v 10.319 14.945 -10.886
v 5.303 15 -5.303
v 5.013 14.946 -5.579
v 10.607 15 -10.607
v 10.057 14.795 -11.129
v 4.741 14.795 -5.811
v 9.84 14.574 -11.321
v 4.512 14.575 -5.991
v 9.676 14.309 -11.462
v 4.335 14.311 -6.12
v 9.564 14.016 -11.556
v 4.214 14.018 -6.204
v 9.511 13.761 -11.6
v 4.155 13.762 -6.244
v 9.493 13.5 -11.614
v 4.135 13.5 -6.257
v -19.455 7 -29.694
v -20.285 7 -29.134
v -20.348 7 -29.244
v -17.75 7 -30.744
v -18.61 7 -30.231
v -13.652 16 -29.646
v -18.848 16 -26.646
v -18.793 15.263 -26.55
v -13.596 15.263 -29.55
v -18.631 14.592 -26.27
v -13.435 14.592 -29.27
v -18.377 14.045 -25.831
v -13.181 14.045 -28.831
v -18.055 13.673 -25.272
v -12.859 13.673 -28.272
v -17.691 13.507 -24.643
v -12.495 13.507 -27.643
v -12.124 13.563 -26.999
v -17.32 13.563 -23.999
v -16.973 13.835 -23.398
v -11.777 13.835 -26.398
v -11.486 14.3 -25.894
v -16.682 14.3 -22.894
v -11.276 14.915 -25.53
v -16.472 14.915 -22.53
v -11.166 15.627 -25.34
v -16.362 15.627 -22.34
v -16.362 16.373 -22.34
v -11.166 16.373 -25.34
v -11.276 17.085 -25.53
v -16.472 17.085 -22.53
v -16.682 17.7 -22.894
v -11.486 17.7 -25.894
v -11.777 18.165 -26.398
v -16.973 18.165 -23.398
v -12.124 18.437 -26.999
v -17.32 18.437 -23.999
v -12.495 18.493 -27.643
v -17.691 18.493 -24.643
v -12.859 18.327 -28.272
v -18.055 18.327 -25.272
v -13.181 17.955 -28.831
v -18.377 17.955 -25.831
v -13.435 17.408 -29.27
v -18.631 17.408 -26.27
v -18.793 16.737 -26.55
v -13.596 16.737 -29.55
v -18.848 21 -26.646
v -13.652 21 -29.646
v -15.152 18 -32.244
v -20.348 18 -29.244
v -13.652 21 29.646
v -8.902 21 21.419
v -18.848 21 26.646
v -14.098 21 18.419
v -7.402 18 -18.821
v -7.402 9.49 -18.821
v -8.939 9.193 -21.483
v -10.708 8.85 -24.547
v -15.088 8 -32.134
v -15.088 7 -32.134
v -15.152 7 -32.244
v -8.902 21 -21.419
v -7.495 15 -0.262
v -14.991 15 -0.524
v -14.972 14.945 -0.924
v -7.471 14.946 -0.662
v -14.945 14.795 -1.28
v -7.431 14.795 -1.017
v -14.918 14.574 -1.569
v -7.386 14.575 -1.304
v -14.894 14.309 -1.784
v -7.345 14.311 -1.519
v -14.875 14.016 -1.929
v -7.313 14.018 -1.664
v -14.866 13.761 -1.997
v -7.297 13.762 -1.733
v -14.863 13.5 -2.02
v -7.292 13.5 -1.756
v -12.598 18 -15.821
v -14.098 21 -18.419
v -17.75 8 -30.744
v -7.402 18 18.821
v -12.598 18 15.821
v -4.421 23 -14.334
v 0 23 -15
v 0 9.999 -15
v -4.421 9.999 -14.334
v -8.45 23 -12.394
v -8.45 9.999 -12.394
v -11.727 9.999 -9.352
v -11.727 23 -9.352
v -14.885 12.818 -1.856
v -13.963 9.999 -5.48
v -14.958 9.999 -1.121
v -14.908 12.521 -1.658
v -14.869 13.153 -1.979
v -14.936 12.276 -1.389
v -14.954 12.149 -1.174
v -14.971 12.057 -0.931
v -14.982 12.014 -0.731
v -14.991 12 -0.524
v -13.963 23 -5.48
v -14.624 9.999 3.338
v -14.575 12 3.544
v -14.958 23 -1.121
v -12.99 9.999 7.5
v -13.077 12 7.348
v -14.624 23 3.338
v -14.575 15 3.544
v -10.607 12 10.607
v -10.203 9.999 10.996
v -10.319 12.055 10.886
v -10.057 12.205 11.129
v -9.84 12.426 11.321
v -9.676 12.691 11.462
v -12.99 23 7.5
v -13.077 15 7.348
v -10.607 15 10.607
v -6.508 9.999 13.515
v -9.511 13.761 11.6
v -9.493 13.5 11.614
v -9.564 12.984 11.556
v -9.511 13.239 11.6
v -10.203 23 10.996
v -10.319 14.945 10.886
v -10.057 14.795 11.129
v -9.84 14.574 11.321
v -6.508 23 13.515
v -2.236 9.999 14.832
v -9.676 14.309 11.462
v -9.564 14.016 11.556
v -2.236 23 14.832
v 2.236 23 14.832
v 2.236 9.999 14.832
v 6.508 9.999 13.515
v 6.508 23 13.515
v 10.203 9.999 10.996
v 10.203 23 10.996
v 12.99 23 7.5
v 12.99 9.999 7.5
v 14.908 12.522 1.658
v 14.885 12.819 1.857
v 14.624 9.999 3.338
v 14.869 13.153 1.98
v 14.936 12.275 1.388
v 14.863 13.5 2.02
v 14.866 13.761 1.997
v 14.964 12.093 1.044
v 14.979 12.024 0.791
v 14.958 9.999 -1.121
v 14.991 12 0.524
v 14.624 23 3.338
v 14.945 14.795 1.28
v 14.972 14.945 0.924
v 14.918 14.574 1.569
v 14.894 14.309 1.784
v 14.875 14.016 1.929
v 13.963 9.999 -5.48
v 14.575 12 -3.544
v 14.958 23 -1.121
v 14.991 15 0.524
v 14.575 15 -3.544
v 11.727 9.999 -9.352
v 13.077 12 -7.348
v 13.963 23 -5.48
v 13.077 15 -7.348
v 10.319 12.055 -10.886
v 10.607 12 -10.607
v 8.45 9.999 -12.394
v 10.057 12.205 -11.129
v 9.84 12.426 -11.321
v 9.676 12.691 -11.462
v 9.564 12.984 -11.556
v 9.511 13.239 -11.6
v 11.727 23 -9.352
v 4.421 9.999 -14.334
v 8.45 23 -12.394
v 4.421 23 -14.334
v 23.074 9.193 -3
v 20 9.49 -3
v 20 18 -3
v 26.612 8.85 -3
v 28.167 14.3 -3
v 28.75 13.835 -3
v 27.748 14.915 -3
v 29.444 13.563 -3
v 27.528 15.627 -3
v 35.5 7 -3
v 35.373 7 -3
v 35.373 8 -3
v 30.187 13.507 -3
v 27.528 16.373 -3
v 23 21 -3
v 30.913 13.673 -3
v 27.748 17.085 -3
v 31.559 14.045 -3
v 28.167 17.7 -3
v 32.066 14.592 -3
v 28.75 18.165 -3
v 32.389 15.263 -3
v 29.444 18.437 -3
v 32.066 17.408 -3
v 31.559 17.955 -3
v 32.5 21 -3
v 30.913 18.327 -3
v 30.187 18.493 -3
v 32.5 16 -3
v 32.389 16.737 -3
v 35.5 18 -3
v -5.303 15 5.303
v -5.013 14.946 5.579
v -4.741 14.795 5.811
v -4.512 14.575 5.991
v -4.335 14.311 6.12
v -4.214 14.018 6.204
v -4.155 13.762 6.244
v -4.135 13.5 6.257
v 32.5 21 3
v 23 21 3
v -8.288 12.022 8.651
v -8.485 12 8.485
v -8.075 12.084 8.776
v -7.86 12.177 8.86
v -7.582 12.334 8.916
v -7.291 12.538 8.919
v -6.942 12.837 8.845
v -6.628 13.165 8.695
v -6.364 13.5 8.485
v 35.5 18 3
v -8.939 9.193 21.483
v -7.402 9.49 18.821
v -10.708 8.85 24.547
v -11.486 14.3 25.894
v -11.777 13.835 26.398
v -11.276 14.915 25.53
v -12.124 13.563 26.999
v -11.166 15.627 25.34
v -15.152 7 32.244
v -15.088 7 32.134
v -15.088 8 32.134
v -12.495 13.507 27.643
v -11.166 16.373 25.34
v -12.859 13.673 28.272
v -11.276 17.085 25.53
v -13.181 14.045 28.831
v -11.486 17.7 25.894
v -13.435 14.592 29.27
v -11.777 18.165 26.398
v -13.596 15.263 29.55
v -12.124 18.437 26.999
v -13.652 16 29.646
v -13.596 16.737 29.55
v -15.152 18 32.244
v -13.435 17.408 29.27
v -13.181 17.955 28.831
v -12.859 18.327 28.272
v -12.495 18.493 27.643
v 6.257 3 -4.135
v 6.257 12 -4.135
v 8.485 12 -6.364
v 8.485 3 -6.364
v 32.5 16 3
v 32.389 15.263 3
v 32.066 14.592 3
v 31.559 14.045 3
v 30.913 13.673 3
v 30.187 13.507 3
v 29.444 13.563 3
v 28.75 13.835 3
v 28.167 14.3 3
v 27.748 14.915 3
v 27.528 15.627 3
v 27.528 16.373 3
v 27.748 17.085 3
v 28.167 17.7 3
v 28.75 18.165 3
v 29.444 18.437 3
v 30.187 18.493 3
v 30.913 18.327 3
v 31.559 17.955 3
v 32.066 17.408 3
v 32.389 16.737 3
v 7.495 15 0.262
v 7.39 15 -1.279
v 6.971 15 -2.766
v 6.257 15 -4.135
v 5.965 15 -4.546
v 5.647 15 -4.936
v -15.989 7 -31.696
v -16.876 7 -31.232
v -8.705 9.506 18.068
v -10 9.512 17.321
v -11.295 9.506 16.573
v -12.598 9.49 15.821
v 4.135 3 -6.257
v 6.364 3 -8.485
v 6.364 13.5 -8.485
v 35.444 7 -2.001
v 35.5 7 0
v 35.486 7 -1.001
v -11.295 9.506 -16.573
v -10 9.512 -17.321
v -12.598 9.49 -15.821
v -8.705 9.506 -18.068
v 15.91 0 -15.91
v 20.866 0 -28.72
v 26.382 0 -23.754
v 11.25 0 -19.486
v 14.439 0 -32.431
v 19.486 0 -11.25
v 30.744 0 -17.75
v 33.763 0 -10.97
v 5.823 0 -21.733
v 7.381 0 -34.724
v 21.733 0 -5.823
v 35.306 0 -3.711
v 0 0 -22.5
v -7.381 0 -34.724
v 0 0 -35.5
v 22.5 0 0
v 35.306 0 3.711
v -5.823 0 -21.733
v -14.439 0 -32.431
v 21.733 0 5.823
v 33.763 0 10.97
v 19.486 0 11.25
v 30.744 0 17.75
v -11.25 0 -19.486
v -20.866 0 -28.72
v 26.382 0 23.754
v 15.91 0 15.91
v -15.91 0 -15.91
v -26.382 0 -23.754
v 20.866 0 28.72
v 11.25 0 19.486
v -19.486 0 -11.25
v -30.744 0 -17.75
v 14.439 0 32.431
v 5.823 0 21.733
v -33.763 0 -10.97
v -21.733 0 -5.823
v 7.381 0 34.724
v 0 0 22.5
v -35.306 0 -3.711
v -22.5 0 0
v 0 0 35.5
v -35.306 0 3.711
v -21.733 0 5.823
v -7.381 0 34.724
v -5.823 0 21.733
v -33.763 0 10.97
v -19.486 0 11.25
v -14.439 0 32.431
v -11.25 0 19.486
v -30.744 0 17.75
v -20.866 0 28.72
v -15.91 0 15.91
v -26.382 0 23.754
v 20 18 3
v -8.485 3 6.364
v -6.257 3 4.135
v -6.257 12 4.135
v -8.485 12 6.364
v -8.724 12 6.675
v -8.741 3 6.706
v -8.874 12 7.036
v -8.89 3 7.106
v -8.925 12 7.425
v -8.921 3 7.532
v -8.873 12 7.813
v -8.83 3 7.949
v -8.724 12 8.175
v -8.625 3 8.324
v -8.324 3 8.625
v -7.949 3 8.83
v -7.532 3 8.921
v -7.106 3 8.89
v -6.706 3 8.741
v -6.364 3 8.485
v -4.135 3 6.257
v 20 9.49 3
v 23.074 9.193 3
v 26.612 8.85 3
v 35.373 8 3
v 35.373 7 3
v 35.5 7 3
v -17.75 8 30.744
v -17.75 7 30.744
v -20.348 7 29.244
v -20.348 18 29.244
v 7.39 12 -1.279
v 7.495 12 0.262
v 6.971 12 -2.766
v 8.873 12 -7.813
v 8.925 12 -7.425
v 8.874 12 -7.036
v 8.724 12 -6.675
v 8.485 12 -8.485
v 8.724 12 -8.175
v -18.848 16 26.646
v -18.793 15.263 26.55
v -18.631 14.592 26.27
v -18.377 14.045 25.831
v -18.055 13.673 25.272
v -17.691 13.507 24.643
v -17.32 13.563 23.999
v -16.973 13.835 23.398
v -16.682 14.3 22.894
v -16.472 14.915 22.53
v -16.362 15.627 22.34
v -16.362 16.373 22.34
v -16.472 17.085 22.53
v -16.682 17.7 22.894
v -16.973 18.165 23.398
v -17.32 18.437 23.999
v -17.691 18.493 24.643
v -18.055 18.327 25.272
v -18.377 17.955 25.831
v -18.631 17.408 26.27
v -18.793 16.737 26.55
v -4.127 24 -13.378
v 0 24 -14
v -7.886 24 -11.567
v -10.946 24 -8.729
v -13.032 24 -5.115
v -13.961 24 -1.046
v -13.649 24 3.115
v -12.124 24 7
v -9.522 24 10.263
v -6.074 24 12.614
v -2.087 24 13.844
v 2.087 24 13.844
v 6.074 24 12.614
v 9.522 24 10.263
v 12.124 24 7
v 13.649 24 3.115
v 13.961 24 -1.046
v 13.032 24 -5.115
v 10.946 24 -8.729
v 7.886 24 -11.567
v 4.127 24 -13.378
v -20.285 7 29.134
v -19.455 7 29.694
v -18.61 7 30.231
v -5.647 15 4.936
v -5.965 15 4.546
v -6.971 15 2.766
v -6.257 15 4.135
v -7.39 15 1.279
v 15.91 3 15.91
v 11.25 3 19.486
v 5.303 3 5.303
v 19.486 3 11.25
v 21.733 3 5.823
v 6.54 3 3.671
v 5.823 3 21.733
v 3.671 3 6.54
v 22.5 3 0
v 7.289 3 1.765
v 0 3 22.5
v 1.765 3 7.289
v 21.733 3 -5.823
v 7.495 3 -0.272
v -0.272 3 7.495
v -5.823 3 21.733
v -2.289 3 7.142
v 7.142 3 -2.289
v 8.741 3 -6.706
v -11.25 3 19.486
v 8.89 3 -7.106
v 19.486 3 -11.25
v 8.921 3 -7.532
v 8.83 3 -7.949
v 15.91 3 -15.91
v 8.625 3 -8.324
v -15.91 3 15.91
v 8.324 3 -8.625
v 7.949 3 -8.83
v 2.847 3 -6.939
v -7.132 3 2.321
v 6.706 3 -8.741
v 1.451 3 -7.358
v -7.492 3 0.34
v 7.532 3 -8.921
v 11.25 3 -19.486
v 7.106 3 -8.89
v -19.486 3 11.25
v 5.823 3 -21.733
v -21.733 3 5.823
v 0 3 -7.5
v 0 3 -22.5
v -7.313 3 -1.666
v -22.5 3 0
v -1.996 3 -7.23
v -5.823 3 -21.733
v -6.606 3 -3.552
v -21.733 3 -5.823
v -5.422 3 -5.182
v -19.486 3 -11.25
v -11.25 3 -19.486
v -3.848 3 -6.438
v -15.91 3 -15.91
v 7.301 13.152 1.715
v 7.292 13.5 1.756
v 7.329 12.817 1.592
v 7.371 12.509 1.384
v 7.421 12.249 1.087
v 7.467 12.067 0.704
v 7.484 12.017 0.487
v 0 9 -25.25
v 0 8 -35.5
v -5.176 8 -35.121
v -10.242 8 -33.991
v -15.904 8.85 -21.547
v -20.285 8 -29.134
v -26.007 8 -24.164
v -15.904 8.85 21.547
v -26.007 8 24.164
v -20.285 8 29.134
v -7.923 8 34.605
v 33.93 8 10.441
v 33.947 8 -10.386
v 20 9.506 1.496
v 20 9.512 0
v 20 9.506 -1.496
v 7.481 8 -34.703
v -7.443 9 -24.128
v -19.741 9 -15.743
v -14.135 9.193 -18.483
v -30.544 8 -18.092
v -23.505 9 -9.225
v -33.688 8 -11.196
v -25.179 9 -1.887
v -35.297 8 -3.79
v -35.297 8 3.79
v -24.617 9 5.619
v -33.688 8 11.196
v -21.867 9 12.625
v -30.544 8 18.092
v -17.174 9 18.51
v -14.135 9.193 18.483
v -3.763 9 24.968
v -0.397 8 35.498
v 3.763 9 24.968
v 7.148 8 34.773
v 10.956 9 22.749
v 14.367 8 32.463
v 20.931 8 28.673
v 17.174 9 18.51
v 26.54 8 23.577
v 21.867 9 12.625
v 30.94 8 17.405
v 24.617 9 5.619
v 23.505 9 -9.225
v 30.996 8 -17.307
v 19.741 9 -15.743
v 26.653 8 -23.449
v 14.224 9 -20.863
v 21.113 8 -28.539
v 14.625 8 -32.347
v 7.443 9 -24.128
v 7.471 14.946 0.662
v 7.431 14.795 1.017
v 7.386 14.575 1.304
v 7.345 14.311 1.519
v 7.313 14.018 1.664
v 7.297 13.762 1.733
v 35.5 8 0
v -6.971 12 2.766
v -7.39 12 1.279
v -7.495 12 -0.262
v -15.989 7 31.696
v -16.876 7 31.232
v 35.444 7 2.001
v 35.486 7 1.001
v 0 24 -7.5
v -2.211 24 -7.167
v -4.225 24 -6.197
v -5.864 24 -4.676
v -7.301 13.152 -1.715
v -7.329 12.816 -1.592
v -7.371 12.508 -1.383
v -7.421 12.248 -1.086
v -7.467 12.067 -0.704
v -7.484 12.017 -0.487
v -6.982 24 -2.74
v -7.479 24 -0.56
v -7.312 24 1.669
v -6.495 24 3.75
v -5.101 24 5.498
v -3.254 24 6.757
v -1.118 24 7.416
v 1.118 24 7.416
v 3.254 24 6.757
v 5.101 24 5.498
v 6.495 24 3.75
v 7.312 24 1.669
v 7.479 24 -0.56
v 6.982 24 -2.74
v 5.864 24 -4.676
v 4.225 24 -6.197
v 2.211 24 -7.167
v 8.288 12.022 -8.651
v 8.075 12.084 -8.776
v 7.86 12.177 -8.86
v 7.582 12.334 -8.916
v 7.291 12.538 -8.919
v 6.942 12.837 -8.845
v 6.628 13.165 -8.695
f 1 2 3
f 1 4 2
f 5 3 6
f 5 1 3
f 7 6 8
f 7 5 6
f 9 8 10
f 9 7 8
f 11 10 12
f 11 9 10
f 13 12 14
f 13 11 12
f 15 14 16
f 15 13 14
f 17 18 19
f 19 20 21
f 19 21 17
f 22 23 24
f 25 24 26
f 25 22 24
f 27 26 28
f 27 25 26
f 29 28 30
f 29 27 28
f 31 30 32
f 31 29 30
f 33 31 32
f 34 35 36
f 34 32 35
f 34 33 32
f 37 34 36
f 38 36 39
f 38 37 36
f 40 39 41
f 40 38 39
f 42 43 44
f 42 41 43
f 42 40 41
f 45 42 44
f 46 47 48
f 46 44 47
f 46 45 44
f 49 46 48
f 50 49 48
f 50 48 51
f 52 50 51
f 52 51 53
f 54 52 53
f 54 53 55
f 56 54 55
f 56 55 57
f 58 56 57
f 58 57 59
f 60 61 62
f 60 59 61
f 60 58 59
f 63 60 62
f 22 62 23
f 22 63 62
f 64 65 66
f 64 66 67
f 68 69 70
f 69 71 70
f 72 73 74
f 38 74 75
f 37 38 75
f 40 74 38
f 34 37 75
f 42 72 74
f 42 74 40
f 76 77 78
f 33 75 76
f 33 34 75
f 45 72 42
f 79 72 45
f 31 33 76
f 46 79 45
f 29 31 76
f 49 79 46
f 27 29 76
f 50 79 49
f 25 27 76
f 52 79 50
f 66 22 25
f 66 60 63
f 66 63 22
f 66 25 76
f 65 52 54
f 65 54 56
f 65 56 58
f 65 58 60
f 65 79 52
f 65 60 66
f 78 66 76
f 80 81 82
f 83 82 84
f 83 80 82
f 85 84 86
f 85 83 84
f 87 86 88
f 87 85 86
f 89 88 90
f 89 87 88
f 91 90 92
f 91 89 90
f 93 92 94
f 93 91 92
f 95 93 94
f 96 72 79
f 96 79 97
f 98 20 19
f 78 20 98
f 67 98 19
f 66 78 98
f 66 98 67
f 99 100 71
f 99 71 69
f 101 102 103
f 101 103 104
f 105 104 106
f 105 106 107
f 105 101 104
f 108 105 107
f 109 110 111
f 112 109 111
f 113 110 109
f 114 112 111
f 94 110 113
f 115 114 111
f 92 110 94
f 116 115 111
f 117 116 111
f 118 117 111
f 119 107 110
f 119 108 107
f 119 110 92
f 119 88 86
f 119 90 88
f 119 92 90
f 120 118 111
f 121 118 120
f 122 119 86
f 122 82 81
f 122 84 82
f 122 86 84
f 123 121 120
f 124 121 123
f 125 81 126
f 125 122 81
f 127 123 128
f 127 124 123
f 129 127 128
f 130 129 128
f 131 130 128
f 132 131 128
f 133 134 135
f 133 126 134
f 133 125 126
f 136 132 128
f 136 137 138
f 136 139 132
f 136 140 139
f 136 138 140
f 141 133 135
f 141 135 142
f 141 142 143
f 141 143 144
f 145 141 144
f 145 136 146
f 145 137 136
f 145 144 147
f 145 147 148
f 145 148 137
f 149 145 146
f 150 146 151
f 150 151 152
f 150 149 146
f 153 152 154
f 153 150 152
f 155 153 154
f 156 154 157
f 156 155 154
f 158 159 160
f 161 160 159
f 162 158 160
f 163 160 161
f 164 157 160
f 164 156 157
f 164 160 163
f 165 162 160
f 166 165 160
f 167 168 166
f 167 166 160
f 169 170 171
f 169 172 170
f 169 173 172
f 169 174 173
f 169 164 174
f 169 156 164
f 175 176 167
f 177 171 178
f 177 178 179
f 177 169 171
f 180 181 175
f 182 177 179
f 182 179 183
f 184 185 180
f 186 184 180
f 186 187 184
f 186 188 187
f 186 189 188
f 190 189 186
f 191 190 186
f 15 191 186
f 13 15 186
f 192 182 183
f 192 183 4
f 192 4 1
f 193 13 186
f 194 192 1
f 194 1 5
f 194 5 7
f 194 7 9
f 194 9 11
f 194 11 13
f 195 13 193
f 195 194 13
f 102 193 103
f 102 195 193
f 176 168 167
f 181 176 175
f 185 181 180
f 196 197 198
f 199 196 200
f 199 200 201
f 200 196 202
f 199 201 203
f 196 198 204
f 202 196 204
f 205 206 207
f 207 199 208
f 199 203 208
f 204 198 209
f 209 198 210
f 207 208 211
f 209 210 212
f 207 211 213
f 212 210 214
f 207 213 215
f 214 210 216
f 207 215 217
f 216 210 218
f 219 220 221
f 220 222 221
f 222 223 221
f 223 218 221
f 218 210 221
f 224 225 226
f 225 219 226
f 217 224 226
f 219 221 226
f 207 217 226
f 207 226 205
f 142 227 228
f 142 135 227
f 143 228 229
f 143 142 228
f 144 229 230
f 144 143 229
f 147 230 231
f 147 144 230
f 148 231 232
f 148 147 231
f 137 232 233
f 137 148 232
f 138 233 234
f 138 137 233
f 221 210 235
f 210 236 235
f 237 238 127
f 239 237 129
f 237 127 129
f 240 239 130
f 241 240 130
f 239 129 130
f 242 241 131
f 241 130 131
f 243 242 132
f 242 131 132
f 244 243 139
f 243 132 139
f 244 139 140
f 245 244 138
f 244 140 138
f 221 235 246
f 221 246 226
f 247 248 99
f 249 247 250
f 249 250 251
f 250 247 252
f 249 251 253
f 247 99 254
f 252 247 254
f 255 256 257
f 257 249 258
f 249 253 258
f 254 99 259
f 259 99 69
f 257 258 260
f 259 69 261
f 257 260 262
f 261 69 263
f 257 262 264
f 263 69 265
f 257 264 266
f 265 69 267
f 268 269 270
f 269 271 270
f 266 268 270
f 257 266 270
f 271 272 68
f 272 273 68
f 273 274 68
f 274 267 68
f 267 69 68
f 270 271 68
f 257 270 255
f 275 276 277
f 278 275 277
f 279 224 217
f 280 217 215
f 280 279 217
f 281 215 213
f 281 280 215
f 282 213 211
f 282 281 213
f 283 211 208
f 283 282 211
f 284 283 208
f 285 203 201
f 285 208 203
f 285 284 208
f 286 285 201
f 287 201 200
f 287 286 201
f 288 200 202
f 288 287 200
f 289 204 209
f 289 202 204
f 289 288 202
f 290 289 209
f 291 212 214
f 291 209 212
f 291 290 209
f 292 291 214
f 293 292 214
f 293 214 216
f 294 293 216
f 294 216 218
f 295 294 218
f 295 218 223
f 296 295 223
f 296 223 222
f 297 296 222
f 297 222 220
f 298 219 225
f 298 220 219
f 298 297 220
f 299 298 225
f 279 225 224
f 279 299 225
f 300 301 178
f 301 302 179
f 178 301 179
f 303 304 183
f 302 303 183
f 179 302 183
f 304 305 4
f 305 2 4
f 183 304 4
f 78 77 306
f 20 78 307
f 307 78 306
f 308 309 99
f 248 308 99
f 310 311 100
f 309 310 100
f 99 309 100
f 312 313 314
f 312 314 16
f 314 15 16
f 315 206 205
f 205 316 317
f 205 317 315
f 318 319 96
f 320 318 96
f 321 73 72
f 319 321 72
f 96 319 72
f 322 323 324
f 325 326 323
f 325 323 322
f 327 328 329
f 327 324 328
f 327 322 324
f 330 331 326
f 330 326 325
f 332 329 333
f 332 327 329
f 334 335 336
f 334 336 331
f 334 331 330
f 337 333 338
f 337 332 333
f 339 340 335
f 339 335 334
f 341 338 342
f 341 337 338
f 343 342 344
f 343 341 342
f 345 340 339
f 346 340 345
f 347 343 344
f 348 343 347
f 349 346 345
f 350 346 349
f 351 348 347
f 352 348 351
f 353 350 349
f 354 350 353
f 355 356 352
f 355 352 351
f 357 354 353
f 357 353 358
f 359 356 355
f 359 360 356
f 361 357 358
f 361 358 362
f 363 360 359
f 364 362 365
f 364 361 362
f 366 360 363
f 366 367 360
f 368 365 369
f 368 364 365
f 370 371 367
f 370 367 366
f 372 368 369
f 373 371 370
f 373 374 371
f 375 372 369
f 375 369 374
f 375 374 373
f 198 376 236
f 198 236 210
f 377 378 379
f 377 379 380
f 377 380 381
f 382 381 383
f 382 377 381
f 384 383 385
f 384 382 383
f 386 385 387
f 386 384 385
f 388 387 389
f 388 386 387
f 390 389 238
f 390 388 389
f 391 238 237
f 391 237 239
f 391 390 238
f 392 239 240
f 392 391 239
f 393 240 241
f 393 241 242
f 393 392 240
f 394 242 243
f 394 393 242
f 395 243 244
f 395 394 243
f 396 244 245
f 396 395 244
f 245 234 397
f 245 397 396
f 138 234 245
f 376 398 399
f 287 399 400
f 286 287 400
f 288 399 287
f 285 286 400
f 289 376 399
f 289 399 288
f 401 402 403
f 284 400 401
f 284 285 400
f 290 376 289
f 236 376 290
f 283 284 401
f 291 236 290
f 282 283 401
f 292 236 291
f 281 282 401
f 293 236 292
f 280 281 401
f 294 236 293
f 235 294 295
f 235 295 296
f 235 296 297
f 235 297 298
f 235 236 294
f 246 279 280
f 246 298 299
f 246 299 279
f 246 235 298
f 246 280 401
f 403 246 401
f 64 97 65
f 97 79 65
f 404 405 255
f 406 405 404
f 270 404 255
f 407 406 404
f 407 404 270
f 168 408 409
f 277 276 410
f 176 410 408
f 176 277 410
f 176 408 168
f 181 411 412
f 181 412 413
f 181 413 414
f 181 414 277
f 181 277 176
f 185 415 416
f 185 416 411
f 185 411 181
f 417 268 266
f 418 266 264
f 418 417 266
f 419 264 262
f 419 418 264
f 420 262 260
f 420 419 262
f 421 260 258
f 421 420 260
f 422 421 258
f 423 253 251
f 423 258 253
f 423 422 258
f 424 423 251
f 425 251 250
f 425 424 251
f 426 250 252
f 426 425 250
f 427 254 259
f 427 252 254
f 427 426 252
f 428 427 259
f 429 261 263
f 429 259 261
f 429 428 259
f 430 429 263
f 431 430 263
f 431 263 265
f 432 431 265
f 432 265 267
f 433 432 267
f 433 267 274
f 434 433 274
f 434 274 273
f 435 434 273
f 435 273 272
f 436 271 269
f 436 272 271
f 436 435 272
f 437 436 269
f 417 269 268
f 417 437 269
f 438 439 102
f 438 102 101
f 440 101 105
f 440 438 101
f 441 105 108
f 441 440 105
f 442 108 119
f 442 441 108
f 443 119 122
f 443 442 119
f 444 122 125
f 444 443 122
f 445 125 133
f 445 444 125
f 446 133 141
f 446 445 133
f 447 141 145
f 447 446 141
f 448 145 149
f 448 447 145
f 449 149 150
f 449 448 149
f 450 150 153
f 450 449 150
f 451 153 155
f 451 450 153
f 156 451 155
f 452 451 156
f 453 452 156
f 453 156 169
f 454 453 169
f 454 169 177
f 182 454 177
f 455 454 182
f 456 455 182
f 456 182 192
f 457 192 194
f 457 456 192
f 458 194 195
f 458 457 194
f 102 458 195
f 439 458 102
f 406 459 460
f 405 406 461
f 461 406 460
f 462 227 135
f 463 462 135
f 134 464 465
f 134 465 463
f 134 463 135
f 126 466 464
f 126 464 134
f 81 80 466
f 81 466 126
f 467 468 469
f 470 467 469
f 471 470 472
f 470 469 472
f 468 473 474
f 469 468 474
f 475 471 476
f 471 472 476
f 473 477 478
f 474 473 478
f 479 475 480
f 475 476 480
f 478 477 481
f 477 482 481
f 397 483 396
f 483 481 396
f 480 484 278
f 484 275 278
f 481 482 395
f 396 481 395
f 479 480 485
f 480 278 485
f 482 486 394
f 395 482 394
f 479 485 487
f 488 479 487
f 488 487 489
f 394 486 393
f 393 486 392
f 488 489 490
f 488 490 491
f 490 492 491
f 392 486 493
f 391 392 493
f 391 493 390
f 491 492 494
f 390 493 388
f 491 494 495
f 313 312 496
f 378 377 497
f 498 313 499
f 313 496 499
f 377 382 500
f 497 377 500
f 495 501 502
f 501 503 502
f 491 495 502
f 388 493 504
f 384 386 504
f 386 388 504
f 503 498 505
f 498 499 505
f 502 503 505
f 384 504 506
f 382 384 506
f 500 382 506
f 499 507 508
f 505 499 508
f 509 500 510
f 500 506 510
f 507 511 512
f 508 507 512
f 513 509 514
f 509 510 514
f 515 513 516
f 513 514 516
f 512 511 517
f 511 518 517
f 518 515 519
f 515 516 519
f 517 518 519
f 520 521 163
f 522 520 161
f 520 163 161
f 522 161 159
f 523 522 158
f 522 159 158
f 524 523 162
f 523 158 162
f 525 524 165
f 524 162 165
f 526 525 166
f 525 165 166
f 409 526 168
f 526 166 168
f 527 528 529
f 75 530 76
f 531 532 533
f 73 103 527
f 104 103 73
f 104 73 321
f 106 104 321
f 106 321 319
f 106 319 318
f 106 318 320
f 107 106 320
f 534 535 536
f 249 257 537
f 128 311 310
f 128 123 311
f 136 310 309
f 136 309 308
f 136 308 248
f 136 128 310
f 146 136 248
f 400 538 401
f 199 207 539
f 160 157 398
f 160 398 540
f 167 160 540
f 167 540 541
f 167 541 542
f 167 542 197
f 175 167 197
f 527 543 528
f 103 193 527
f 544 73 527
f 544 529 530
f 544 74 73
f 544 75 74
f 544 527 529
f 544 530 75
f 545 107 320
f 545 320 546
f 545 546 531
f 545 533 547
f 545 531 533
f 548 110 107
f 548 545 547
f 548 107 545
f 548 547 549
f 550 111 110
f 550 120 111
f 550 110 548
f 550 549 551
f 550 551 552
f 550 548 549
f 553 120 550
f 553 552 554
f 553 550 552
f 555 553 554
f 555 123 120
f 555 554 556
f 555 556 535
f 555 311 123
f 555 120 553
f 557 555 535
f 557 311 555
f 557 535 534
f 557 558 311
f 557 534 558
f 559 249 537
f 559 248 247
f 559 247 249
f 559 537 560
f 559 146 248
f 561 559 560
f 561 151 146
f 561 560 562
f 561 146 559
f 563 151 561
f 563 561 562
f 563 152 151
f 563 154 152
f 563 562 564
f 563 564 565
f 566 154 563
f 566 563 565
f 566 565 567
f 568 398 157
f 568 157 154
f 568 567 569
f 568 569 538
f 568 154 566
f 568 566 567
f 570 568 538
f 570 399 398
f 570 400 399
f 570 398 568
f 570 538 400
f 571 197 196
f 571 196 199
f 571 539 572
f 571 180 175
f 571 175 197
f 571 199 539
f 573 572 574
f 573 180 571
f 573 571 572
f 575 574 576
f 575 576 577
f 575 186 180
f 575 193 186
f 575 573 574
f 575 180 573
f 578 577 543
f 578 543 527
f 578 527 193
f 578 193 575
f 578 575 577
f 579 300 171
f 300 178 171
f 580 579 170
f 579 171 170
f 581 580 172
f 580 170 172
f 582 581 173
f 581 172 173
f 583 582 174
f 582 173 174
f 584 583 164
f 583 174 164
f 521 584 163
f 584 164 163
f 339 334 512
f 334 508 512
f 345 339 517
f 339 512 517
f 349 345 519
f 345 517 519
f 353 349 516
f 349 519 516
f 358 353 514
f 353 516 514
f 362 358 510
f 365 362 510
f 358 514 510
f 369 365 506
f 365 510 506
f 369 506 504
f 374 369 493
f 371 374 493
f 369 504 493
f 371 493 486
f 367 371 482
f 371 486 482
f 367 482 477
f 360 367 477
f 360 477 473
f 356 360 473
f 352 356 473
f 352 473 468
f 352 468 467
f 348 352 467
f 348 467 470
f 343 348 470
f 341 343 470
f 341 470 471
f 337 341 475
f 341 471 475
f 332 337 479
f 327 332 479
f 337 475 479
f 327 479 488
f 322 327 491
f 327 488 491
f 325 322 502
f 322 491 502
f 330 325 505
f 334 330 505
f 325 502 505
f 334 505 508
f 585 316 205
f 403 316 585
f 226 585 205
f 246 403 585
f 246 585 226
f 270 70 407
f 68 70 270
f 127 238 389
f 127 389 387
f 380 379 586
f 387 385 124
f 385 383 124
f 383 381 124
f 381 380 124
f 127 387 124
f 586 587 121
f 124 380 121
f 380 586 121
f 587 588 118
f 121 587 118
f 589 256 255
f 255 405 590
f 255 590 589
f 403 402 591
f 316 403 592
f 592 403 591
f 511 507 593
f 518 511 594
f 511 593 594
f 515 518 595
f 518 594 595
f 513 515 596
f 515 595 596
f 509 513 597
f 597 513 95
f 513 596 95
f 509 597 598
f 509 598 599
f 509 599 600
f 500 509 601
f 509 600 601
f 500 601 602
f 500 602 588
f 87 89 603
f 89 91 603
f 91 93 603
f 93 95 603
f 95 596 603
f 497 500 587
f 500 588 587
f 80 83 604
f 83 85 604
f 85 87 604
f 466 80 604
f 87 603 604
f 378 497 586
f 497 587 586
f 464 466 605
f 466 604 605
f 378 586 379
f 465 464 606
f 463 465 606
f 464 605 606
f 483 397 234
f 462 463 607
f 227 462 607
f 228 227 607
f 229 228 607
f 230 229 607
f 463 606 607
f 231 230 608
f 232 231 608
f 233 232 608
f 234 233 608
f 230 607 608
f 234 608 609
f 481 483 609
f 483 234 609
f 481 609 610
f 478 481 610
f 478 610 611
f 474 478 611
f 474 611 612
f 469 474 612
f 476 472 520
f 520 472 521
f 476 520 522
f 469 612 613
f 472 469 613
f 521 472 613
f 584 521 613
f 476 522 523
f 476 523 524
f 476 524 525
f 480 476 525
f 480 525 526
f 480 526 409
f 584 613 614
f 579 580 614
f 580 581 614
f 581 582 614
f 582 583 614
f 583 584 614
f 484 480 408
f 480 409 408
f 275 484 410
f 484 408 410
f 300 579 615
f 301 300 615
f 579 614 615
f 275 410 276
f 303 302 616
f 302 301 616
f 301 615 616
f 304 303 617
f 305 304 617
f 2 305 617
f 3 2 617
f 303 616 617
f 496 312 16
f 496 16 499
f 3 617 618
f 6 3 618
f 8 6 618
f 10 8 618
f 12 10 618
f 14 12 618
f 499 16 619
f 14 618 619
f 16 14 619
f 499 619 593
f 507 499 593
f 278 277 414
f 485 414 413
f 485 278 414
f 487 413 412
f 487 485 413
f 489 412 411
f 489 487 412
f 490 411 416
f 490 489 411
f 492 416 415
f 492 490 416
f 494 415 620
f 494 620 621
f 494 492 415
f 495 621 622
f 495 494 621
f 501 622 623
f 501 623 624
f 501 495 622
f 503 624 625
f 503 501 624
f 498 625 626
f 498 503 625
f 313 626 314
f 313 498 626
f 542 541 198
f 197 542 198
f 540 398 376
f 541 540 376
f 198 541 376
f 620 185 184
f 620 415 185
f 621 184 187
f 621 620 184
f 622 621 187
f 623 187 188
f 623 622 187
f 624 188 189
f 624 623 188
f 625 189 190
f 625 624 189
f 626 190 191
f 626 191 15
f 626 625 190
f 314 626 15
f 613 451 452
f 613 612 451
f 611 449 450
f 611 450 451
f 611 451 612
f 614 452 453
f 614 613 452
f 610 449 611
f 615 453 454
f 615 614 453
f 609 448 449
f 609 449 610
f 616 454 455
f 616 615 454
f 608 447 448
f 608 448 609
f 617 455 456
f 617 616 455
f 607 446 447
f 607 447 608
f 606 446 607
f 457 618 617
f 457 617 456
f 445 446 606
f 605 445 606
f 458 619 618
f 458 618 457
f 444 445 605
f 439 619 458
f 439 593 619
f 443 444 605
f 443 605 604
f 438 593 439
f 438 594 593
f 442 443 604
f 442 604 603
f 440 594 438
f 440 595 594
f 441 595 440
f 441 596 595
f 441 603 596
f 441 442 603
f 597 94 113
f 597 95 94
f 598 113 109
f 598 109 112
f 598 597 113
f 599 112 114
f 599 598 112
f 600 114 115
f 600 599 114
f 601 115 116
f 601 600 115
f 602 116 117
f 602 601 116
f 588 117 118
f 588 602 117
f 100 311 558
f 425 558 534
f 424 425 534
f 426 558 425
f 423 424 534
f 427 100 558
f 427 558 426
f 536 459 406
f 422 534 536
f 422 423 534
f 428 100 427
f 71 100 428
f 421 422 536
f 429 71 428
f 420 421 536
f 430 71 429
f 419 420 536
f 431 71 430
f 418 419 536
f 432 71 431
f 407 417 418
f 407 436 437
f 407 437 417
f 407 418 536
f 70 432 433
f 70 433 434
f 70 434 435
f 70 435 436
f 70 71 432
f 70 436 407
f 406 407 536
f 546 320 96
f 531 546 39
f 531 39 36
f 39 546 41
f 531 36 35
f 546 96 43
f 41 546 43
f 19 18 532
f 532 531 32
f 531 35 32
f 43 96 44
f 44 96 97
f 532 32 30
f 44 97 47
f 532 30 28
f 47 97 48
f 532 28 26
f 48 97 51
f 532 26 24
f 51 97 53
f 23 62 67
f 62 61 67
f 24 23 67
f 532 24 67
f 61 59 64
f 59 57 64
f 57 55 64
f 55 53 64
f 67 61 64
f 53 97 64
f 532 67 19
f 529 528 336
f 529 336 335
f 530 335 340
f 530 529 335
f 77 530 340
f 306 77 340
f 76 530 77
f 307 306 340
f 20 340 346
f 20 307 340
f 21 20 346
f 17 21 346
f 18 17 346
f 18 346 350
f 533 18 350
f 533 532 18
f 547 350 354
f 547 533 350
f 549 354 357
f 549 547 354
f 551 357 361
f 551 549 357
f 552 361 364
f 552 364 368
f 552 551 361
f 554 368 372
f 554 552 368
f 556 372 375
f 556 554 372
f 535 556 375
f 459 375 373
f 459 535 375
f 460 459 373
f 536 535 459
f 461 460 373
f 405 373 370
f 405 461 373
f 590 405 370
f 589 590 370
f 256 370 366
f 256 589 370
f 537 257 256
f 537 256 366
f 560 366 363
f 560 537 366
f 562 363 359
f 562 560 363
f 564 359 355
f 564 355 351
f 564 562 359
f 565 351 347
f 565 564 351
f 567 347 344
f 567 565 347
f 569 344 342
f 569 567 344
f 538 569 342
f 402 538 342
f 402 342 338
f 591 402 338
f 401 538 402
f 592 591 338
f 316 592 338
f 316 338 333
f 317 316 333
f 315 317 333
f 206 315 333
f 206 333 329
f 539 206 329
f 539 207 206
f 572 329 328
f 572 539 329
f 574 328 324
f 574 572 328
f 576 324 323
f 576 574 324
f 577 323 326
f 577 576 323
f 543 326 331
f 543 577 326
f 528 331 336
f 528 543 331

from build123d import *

# Parameters (mm, degrees)
SKETCH2_W           = 15.5
SKETCH2_H           = 14
BOSS_EXTRUDE1_DEPTH = 3
CIRPATTERN1_COUNT   = 3
CUT_EXTRUDE1_DEPTH  = 12
CUT_EXTRUDE2_START  = -9
CUT_EXTRUDE2_DEPTH  = 3
CUT_EXTRUDE3_REACH  = 60.279
SKETCH6_R           = 2.5
CIRPATTERN2_COUNT   = 3
FILLET1_R           = 1.5
CHAMFER1_SIZE       = 3
CHAMFER2_SIZE       = 1


with BuildPart() as part:
    # Sketch1 → Revolve1 (revolve)
    with BuildSketch(Plane.XY, mode=Mode.PRIVATE) as revolve1_sk:
        Polygon((0, 0), (35.5, 0), (35.5, 8), (15, 9.999206161), (15, 24), (0, 24), align=None)
    revolve(revolve1_sk.sketch.rotate(Axis((0, -5.176379432, 0), (0, 1, 0)), 90), axis=Axis((0, -5.176379432, 0), (0, 1, 0)))

    # Sketch2 → Boss-Extrude1 (add, symmetric)
    with BuildSketch(Plane.XY):
        with Locations((27.75, 14)):
            Rectangle(SKETCH2_W, SKETCH2_H)
    boss_extrude1 = extrude(amount=BOSS_EXTRUDE1_DEPTH, both=True)

    # CirPattern1: Boss-Extrude1 ×3 about axis
    cirpattern1_axis = Axis((0, 0, 0), (0, 1, 0))
    for i in range(1, CIRPATTERN1_COUNT):
        add(boss_extrude1.rotate(cirpattern1_axis, i * 360 / CIRPATTERN1_COUNT))

    # Sketch3 → Cut-Revolve1 (revolve, cut)
    with BuildSketch(Plane.XY, mode=Mode.PRIVATE) as cut_revolve1_sk:
        Polygon((0, 0), (22.5, 0), (22.5, 3), (7.5, 3), (7.5, 24), (0, 24), align=None)
    revolve(cut_revolve1_sk.sketch.rotate(Axis((0, -2.419018625, 0), (0, 1, 0)), 90), axis=Axis((0, -2.419018625, 0), (0, 1, 0)), mode=Mode.SUBTRACT)

    # Sketch4 → Cut-Extrude1 (cut)
    with BuildSketch(Plane.XZ.offset(-3)):
        with BuildLine():
            Line((-6.363961031, 8.485281374), (8.485281374, -6.363961031))
            ThreePointArc((8.485281374, -6.363961031), (8.485281374, -8.485281374), (6.363961031, -8.485281374))
            Line((6.363961031, -8.485281374), (-8.485281374, 6.363961031))
            ThreePointArc((-8.485281374, 6.363961031), (-8.485281374, 8.485281374), (-6.363961031, 8.485281374))
        make_face()
    extrude(amount=-CUT_EXTRUDE1_DEPTH, mode=Mode.SUBTRACT)

    # Sketch5 → Cut-Extrude2 (cut)
    with BuildSketch(Plane(origin=(0, 24, 0), x_dir=(1, 0, 0), z_dir=(0, 1, 0)).offset(CUT_EXTRUDE2_START)):
        with BuildLine():
            Line((9.492775288, 11.614095631), (4.135492251, 6.256812594))
            ThreePointArc((4.135492251, 6.256812594), (6.97813176, 2.7487592), (7.291643494, -1.755544118))
            Line((7.291643494, -1.755544118), (14.86337052, -2.019954652))
            ThreePointArc((14.86337052, -2.019954652), (13.95626352, 5.497518401), (9.492775288, 11.614095631))
        make_face()
        with BuildLine():
            Line((-4.135492251, -6.256812594), (-9.492775288, -11.614095631))
            ThreePointArc((-9.492775288, -11.614095631), (-13.95626352, -5.497518401), (-14.86337052, 2.019954652))
            Line((-14.86337052, 2.019954652), (-7.291643494, 1.755544118))
            ThreePointArc((-7.291643494, 1.755544118), (-6.97813176, -2.7487592), (-4.135492251, -6.256812594))
        make_face()
    extrude(amount=-CUT_EXTRUDE2_DEPTH, mode=Mode.SUBTRACT)

    # Sketch6 → Cut-Extrude3 (cut, up to next)
    with BuildSketch(Plane(origin=(-2.598076211, 0, -1.5), x_dir=(0.500000000000004, 0, -0.8660254037844364), z_dir=(0.8660254037844365, 0, 0.500000000000004)), mode=Mode.PRIVATE) as cut_extrude3_sk1:
        with Locations(Location((-30, 16, 0), (0, 0, 180))):
            Circle(SKETCH6_R)
    cut_extrude3_tool1 = extrude(cut_extrude3_sk1.sketch, amount=CUT_EXTRUDE3_REACH, mode=Mode.PRIVATE) & part.part
    cut_extrude3 = cut_extrude3_tool1.solids().sort_by_distance((-17.598076, 16, 24.480762))[0]
    add(cut_extrude3, mode=Mode.SUBTRACT)

    # CirPattern2: Cut-Extrude3 ×3 about axis
    cirpattern2_axis = Axis((0, -5.176379432, 0), (0, -1, 0))
    for i in range(1, CIRPATTERN2_COUNT):
        add(cut_extrude3.rotate(cirpattern2_axis, i * 360 / CIRPATTERN2_COUNT), mode=Mode.SUBTRACT)

    # Fillet1
    fillet1_edges = [part.edges().sort_by_distance(p)[0] for p in [
        (11.077507007, 15, 1.887749385),
        (11.077507007, 12, 1.887749385),
        (6.814133769, 15, -8.935454113),
        (7.928368159, 12, -10.049688503),
        (-6.814133769, 15, 8.935454113),
        (-7.928368159, 12, 10.049688503),
        (-11.077507007, 15, -1.887749385),
        (-11.077507007, 12, -1.887749385),
    ]]
    fillet(fillet1_edges, radius=FILLET1_R - 0.0001)  # a hair under: the kernel refuses the full size

    # Chamfer1
    chamfer1_edges = [part.edges().sort_by_distance(p)[0] for p in [
        (35.5, 21, 0),
        (20, 21, 0),
        (-17.75, 21, 30.743901834),
        (-10, 21, 17.320508076),
        (-17.75, 21, -30.743901834),
        (-10, 21, -17.320508076),
    ]]
    chamfer(chamfer1_edges, length=CHAMFER1_SIZE)

    # Chamfer2
    chamfer2_edges = [part.edges().sort_by_distance(p)[0] for p in [
        (0, 24, 15),
    ]]
    chamfer(chamfer2_edges, length=CHAMFER2_SIZE)


solid = part.part
